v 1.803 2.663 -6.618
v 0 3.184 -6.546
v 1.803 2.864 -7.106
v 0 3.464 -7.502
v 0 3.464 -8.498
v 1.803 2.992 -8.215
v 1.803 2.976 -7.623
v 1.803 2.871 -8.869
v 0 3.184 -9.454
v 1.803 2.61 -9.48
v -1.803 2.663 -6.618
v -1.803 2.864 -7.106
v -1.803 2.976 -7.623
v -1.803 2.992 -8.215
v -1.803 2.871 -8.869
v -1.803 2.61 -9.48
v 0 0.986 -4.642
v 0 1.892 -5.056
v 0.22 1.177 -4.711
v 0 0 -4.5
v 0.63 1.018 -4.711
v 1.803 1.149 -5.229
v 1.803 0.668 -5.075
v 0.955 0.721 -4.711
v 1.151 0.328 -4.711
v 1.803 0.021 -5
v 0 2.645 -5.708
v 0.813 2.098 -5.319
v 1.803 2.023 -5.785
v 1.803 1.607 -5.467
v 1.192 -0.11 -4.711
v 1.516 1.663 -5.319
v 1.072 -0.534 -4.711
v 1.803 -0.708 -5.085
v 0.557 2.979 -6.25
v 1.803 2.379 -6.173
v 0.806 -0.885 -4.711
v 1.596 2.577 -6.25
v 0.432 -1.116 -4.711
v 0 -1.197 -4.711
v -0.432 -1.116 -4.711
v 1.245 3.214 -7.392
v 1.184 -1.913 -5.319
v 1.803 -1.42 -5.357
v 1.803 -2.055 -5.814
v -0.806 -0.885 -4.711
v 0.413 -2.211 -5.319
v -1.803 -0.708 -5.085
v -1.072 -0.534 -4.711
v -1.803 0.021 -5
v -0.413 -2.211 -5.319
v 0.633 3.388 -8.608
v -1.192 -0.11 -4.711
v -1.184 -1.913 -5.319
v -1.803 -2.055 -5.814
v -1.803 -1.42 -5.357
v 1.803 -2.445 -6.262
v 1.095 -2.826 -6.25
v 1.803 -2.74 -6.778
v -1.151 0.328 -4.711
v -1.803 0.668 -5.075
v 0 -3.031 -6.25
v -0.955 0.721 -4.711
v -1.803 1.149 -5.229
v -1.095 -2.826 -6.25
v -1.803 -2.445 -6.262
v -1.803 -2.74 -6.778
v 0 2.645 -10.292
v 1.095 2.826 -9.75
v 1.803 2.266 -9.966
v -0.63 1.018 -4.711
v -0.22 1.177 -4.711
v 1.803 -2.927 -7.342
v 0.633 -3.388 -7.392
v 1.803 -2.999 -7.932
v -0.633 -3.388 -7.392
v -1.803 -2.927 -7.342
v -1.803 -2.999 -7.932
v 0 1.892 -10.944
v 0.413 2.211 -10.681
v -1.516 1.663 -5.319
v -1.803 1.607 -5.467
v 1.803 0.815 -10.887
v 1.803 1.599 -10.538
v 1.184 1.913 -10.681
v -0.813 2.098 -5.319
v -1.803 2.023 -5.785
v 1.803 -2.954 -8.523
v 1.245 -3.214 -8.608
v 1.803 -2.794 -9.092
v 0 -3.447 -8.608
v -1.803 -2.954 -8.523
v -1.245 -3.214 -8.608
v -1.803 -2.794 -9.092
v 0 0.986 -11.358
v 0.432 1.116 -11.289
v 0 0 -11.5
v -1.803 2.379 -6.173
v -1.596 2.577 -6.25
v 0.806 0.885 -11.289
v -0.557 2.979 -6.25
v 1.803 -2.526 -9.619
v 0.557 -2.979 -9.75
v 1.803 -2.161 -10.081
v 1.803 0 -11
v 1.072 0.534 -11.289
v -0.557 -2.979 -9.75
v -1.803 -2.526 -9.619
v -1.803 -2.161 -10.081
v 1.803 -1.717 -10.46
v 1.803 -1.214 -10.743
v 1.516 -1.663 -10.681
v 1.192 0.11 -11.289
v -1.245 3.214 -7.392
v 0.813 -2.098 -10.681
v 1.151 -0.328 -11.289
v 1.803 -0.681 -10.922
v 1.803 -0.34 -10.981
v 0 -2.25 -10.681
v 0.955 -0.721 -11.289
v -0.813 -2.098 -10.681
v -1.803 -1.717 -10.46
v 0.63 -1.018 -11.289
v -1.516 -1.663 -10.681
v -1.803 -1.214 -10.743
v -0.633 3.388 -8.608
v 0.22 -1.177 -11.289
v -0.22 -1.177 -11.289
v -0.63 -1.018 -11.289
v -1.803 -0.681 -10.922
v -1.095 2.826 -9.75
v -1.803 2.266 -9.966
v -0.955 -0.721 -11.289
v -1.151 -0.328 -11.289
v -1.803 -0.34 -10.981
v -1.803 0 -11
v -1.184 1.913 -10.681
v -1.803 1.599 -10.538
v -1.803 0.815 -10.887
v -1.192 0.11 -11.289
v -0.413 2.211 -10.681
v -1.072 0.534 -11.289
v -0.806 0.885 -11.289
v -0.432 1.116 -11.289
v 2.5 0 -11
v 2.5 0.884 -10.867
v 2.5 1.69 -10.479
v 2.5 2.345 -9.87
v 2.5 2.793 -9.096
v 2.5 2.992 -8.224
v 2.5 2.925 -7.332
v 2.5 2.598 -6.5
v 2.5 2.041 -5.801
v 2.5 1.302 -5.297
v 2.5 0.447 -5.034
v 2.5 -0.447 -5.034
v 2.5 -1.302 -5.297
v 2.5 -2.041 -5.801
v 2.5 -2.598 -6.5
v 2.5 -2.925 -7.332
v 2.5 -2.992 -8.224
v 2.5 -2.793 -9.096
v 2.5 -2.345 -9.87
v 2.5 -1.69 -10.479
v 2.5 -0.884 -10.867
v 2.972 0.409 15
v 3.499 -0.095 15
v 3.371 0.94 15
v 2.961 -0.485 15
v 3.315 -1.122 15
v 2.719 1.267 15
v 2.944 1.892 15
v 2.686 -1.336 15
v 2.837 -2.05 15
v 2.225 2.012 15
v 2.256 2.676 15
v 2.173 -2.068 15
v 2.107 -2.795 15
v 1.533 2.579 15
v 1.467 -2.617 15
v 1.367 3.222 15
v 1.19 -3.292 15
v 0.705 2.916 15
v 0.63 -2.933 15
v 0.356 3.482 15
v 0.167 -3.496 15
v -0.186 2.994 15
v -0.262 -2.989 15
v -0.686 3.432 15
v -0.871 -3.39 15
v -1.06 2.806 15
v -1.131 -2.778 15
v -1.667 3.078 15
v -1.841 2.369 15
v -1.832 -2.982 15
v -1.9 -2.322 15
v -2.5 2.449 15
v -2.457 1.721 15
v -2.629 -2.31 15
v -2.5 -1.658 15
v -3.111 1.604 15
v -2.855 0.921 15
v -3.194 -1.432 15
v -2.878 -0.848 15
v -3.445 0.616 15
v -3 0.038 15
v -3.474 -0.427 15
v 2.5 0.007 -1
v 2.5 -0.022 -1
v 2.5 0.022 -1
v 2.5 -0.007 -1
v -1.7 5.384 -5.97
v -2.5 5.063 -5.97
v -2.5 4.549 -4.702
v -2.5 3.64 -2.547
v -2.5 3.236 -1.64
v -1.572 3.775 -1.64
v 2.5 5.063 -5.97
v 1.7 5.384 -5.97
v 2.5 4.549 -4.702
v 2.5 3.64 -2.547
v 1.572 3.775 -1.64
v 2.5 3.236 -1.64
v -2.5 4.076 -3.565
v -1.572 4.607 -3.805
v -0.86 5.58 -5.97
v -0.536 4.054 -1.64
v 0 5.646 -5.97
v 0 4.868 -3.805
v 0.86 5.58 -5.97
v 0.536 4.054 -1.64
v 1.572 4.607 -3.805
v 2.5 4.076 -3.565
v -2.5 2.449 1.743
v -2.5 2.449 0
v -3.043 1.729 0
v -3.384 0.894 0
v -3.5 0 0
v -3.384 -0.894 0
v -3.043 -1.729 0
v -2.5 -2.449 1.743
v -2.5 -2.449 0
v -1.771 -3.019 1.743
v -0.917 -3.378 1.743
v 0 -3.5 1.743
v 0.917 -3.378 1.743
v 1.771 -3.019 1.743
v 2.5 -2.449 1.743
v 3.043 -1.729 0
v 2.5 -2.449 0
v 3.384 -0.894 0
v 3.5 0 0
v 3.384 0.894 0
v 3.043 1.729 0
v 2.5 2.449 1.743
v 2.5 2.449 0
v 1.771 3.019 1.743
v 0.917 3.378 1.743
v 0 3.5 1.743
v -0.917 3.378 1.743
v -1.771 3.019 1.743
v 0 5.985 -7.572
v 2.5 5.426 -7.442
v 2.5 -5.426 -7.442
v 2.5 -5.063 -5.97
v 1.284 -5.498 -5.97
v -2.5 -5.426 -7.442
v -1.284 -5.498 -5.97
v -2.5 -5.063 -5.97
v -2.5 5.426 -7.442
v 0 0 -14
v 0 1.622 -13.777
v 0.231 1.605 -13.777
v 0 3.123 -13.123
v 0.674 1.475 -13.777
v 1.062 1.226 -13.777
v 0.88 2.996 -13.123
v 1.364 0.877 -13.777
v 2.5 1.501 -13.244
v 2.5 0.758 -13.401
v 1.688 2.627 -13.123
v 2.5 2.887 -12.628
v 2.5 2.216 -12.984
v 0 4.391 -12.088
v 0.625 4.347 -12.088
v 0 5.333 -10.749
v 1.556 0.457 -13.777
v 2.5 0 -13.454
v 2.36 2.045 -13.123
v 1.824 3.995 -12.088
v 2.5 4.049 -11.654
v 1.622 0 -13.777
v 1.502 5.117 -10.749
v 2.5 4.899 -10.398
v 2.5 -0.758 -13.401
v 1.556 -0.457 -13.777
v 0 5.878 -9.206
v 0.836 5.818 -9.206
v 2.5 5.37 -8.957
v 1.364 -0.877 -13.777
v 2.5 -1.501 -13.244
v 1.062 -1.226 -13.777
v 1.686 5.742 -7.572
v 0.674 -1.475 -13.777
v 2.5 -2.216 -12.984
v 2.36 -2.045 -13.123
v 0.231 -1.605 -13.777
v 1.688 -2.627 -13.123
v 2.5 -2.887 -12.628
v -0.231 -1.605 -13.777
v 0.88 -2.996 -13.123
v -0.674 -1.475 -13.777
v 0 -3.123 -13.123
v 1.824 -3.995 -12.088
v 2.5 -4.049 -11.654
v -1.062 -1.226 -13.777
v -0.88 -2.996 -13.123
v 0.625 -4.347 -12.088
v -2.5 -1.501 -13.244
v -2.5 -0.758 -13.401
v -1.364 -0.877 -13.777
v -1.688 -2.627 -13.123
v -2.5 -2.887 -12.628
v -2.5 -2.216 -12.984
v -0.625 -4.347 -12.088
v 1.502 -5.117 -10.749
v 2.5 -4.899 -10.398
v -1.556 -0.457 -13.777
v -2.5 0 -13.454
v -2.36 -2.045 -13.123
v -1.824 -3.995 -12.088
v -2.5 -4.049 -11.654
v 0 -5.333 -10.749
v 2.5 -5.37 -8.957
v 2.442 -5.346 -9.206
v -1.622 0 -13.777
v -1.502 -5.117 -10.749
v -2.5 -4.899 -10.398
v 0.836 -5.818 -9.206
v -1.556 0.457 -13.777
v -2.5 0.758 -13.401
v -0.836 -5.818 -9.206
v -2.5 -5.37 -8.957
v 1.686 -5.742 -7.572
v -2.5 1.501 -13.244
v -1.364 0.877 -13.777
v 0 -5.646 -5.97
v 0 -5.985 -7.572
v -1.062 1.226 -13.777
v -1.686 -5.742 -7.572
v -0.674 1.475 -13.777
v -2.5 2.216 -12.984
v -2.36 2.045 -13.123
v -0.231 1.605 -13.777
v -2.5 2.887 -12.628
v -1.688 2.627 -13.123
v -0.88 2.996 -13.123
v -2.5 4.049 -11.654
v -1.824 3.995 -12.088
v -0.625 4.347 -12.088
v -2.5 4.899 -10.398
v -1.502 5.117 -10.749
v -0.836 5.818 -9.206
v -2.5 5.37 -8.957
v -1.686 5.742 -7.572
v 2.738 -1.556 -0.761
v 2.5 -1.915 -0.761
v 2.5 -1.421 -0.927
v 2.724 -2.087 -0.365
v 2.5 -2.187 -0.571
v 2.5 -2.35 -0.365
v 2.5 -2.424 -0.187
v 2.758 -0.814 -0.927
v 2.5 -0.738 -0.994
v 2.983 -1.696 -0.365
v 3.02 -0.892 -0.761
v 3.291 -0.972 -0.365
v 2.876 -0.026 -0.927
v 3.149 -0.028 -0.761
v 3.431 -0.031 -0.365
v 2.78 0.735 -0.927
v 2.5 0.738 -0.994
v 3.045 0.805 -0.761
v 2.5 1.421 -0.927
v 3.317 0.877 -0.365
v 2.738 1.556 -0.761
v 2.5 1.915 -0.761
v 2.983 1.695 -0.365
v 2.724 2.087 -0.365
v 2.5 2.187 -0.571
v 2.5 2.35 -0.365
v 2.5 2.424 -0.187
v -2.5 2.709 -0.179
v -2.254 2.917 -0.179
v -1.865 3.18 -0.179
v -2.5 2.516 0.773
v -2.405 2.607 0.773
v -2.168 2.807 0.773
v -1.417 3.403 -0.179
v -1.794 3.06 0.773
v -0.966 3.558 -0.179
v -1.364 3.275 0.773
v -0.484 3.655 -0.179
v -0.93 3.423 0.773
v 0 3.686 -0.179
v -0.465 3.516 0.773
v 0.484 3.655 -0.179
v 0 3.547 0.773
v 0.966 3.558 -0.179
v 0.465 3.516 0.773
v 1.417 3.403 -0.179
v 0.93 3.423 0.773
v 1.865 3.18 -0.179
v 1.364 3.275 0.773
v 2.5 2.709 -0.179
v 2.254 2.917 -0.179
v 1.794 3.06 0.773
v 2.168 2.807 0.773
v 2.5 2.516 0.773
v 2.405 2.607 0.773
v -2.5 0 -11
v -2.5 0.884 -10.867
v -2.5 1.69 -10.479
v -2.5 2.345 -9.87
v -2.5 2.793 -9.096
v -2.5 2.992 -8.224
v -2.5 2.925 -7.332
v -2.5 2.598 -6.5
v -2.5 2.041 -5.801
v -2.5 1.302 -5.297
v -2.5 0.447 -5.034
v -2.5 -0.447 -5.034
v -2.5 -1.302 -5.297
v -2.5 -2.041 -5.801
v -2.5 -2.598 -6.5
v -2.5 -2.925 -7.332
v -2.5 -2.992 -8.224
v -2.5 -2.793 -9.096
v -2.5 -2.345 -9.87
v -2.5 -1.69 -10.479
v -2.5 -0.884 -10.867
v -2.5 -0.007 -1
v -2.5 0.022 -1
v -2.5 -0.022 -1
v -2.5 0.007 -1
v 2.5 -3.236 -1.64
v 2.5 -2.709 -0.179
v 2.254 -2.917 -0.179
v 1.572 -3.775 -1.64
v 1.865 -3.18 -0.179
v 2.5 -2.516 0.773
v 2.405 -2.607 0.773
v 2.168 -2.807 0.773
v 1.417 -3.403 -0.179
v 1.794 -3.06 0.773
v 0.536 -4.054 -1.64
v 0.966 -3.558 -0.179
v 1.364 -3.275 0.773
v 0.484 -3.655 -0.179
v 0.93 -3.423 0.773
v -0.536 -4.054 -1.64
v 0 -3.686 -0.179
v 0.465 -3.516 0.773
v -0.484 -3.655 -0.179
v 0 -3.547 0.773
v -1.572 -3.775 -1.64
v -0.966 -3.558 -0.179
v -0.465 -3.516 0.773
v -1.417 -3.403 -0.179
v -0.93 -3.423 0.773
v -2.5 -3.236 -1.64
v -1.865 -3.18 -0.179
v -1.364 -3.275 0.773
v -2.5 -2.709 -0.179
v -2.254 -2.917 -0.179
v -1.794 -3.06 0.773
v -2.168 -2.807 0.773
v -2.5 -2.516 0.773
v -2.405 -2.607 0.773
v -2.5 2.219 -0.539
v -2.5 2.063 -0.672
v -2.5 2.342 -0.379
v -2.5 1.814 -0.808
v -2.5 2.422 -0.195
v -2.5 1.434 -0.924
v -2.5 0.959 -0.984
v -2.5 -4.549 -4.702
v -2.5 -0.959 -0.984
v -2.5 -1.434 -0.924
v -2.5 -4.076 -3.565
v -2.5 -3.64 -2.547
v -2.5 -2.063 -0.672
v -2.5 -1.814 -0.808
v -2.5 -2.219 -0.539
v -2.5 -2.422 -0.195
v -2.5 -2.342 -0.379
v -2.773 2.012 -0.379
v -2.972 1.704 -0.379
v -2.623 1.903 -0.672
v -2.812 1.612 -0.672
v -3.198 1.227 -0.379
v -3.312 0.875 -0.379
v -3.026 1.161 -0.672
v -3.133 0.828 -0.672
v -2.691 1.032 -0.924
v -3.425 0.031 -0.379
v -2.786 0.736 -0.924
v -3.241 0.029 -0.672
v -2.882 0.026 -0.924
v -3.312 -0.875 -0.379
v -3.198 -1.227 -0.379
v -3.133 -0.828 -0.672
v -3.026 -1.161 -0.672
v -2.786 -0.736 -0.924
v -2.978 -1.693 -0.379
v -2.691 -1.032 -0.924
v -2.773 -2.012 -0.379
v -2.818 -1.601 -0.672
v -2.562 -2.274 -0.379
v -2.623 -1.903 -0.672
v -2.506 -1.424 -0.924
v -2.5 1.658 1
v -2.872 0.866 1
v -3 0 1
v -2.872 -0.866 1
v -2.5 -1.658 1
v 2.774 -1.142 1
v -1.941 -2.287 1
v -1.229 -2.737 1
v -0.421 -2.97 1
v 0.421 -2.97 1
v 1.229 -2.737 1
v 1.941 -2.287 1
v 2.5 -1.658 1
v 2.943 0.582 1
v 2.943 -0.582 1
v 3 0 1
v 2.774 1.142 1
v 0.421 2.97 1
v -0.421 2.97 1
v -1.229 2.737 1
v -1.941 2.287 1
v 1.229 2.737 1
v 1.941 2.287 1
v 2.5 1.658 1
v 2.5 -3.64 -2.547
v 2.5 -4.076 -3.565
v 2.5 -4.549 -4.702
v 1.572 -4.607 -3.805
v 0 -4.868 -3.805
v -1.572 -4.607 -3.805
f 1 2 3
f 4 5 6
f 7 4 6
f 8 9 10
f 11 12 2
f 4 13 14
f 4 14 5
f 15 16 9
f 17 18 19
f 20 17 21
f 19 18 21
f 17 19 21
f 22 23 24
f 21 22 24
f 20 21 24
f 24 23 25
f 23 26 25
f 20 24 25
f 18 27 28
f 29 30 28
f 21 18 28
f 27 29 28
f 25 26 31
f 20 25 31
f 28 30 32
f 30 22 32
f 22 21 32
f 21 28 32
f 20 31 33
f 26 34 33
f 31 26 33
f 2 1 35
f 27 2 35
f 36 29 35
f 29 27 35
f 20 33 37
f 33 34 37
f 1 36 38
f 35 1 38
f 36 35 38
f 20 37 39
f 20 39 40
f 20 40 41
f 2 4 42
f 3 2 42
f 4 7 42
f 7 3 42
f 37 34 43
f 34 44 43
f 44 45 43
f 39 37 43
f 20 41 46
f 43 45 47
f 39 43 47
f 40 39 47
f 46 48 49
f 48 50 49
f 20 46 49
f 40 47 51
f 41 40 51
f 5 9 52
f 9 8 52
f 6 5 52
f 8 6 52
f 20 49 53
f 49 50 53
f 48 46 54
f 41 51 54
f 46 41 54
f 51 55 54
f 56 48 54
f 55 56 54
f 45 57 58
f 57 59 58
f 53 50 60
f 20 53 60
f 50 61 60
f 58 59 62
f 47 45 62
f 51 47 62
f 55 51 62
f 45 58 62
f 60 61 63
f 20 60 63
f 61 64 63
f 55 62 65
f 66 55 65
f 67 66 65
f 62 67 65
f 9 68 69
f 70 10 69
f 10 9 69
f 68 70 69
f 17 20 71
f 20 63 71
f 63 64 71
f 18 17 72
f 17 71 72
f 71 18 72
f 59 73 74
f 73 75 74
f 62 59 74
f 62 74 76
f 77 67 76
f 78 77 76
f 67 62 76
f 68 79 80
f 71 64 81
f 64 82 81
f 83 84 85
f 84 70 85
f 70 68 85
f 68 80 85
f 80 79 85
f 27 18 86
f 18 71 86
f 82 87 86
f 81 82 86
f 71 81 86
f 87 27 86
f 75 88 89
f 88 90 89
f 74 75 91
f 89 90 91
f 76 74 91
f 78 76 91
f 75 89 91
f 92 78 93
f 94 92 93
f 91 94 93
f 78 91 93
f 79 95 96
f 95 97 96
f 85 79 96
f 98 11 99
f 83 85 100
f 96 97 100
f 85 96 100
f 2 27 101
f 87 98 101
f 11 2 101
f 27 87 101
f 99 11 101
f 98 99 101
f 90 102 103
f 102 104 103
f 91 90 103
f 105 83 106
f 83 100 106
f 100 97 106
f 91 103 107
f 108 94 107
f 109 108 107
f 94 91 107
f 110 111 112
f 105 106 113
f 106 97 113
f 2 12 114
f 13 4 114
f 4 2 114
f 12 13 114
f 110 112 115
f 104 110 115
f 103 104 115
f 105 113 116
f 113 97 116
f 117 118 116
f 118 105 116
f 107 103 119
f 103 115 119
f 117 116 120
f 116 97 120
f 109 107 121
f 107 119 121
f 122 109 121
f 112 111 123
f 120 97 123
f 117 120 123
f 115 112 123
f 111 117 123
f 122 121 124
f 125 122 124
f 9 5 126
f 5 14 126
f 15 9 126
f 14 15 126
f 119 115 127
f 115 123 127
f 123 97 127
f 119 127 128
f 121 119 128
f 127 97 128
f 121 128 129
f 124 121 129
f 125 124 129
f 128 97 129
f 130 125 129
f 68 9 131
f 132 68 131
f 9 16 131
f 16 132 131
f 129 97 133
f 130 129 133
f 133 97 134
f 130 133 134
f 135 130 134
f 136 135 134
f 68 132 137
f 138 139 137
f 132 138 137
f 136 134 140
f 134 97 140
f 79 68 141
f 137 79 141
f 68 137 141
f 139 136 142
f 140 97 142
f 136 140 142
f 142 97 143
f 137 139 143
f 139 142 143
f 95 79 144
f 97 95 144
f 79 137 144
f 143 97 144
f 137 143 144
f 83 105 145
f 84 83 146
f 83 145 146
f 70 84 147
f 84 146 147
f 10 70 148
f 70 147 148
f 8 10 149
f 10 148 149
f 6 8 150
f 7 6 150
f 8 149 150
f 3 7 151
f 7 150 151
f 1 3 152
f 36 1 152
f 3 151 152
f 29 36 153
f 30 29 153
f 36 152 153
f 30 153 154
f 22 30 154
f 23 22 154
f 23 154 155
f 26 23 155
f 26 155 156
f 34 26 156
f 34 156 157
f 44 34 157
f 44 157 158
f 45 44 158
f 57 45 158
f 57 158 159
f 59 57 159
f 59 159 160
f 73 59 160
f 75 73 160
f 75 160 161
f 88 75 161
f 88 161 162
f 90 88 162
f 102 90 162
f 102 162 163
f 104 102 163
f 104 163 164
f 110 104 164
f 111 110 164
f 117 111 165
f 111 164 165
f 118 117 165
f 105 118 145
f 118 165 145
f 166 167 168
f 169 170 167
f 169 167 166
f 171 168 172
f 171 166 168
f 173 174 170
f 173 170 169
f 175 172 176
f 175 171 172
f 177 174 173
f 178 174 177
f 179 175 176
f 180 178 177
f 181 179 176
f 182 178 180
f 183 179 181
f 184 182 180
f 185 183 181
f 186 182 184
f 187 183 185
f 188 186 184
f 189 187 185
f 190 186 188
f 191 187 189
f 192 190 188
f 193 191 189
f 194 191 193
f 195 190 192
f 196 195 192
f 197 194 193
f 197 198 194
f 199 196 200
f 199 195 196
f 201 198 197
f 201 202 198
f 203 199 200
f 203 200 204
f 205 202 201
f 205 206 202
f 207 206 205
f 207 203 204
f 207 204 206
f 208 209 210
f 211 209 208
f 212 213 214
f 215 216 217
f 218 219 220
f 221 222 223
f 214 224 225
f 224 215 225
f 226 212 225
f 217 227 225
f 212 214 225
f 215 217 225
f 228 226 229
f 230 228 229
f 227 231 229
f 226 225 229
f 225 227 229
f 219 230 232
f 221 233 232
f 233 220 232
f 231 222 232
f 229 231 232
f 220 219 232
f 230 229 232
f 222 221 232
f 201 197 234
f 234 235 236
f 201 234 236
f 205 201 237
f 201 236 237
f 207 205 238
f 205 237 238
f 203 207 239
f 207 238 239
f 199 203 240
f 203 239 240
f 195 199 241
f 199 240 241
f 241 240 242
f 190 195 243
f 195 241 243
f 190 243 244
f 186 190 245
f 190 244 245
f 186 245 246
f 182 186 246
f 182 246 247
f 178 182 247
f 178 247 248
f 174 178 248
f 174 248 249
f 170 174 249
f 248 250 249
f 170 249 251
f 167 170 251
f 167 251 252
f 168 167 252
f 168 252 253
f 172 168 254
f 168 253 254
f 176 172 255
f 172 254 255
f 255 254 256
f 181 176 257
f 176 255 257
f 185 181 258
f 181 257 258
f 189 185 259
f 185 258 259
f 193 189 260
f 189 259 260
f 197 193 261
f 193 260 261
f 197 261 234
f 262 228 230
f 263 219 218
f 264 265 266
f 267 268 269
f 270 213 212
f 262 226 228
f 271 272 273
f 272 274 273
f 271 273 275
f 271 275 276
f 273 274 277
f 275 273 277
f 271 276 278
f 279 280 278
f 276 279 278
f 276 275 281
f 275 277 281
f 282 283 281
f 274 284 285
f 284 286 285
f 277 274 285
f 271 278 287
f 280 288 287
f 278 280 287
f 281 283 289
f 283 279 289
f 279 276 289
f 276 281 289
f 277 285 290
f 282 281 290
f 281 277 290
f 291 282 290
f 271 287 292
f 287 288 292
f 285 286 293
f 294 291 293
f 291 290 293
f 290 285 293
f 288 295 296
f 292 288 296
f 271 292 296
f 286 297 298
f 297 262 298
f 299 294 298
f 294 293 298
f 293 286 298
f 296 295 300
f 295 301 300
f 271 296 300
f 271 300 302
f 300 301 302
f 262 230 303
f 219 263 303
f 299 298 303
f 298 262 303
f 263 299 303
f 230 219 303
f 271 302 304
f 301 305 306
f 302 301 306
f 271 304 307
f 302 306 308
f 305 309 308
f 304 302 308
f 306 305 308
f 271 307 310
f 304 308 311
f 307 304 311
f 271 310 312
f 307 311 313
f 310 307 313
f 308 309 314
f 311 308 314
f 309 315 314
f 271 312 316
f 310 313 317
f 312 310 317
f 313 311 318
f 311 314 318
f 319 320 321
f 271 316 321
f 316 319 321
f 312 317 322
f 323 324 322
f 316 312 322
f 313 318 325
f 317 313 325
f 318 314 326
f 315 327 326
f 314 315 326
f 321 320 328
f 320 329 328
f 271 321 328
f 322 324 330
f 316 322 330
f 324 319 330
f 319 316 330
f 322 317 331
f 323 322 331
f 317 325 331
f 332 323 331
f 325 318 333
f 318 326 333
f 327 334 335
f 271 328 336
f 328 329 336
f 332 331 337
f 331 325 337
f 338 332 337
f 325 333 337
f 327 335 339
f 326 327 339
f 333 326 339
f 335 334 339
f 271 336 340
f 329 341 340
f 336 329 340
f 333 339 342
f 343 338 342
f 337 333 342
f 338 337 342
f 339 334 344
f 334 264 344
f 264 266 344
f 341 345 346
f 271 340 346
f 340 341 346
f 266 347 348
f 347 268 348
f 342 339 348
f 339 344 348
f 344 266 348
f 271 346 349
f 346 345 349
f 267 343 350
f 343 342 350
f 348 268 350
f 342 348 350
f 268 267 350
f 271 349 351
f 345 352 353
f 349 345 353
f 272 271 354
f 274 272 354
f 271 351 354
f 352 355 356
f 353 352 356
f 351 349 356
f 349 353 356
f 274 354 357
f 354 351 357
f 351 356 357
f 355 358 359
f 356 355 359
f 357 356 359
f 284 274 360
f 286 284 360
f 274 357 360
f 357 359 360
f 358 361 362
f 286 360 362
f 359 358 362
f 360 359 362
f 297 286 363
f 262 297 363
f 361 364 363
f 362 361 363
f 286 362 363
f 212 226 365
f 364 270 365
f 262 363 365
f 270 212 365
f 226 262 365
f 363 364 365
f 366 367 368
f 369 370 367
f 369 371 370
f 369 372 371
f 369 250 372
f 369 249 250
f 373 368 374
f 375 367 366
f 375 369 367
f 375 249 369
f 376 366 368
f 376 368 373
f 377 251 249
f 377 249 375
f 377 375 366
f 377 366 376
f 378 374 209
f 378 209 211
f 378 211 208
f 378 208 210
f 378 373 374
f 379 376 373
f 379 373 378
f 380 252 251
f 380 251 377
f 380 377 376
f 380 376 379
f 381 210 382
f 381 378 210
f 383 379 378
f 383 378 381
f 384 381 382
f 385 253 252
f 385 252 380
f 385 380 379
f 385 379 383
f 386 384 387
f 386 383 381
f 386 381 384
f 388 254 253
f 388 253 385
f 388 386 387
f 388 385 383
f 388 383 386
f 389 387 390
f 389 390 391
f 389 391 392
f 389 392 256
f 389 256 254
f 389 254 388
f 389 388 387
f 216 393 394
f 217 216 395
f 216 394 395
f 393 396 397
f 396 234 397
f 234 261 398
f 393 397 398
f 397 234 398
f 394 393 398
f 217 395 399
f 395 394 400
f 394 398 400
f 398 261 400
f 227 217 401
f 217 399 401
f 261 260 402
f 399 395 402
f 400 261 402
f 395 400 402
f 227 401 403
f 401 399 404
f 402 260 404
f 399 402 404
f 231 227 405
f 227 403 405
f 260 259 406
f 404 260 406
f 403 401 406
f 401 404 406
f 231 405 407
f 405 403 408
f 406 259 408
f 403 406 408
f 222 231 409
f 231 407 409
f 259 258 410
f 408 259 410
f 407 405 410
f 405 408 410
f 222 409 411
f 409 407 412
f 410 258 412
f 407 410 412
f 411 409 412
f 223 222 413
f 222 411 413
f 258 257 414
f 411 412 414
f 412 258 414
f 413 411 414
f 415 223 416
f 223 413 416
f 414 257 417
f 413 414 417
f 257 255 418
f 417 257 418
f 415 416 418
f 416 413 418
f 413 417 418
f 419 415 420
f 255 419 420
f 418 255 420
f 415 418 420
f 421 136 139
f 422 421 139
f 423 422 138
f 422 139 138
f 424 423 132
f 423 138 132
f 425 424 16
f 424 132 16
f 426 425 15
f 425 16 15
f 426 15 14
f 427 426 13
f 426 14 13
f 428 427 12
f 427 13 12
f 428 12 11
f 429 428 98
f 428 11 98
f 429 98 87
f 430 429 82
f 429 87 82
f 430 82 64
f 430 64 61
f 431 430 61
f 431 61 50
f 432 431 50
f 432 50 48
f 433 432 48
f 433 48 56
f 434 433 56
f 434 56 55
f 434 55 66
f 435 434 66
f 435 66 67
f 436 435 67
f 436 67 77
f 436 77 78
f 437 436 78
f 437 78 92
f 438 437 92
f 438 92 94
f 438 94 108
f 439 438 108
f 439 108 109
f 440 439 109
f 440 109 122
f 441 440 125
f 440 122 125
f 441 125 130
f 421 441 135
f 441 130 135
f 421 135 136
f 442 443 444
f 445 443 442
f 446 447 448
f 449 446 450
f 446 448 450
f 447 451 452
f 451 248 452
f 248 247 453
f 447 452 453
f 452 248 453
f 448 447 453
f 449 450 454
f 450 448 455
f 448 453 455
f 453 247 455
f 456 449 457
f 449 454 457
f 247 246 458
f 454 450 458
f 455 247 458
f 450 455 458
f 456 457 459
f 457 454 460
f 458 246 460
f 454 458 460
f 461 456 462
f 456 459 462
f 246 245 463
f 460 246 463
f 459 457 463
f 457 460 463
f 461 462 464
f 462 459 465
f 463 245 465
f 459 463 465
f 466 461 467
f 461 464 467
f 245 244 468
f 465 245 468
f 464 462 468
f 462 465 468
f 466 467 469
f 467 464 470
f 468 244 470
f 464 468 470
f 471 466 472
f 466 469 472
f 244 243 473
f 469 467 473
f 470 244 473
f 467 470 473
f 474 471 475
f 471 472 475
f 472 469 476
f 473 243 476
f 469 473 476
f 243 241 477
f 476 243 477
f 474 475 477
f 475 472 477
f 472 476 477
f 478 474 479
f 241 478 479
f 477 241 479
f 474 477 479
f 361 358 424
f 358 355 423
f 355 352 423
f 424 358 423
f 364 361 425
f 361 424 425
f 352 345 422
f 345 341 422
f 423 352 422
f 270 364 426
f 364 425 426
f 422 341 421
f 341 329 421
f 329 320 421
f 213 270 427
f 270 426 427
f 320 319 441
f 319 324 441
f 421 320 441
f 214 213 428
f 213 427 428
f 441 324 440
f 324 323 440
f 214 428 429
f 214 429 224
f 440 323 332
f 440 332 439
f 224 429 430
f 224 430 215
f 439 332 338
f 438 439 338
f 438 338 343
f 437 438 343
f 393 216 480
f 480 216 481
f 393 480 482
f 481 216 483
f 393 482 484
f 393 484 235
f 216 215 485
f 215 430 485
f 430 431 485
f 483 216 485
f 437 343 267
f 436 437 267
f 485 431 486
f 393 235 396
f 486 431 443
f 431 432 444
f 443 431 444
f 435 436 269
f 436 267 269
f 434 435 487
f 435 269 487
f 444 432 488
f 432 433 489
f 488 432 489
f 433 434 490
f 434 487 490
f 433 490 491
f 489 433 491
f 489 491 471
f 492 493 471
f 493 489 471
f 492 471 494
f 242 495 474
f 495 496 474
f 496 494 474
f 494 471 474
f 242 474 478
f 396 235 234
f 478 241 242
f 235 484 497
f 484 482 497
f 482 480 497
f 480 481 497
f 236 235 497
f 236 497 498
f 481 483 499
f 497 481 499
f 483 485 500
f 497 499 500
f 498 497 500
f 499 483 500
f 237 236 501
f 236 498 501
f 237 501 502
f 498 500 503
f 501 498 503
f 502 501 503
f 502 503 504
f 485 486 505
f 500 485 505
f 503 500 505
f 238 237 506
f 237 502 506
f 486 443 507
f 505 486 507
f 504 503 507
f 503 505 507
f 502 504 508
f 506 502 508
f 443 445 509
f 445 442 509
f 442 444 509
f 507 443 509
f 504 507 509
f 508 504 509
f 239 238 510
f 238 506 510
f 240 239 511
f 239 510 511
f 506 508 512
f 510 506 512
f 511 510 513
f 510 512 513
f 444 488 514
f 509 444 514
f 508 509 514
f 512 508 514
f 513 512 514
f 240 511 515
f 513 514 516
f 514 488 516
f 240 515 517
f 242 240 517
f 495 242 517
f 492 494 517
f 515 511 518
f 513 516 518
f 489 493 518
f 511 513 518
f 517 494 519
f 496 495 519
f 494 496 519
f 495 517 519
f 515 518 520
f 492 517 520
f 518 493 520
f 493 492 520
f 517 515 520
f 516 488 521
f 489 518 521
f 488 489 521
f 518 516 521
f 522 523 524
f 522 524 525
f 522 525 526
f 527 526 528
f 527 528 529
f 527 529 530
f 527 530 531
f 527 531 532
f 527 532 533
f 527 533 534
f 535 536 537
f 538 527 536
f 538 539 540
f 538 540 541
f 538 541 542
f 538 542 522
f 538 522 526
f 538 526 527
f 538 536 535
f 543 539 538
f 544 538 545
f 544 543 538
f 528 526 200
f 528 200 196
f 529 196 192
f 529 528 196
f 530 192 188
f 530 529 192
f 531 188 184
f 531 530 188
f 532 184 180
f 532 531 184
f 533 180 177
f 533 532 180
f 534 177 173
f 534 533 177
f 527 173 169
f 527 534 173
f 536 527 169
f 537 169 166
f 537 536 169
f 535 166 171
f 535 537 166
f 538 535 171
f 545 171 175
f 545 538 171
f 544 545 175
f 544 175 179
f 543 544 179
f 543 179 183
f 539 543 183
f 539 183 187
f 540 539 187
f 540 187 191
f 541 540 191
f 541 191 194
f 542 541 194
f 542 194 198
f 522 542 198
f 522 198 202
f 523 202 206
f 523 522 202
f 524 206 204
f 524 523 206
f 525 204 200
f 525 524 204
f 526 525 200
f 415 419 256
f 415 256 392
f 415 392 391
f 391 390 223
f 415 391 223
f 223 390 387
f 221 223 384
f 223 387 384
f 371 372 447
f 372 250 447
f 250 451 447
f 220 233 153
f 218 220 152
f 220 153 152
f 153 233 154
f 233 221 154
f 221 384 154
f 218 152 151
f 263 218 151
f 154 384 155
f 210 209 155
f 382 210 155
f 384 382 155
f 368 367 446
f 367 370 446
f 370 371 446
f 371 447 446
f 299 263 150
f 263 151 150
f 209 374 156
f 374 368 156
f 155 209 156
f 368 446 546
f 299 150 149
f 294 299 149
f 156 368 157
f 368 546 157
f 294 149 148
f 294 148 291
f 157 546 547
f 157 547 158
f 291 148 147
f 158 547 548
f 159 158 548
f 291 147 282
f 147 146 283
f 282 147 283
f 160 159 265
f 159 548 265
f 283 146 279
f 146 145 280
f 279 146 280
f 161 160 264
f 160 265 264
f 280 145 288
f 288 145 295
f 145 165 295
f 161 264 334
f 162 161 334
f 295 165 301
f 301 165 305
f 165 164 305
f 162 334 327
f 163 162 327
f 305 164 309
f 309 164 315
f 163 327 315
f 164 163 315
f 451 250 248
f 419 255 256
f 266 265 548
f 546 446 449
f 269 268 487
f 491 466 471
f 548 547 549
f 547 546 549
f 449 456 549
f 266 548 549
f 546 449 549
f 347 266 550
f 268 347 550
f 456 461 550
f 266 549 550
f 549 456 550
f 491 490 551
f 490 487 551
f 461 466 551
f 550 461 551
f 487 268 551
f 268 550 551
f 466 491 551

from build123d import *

# Parameters (mm, degrees)
SKETCH2_W           = 3.765548925
SKETCH2_H           = 14.748929387
SKETCH2_W_2         = 4.619974481
CUT_EXTRUDE1_DEPTH  = 17.5
CHAMFER1_SIZE       = 0.353571801
CHAMFER1_SIZE_2     = 0.5
SKETCH3_R           = 3
CUT_EXTRUDE2_DEPTH  = 35
SKETCH4_R           = 3.5
SKETCH4_R_2         = 3
BOSS_EXTRUDE1_DEPTH = 15
BOSS_EXTRUDE2_DEPTH = 1
BOSS_EXTRUDE3_START = -1
SKETCH4_2_R         = 3.5
SKETCH4_2_R_2       = 3
BOSS_EXTRUDE3_DEPTH = 1
BOSS_EXTRUDE4_START = -1
BOSS_EXTRUDE4_DEPTH = 1
FILLET1_R           = 1
FILLET2_R           = 10


# Some blends are built 0.0001 mm under size
with BuildPart() as part:
    # Sketch1 → Revolve1 (revolve)
    with BuildSketch(Plane(origin=(0, 0, 0), x_dir=(0, 0, -1), z_dir=(1, 0, 0))):
        with BuildLine():
            Line((0, 3.5), (0, 0))
            Line((0, 0), (4.5, 0))
            ThreePointArc((4.5, 0), (8, 3.5), (11.5, 0))
            Line((11.5, 0), (14, 0))
            ThreePointArc((14, 0), (11.451186904, 4.908086078), (5.97023035, 5.6462408))
            Line((5.97023035, 5.6462408), (0, 3.5))
        make_face()
    revolve(axis=Axis((0, 0, 0), (0, 0, -1)))

    # Sketch2 → Cut-Extrude1 (cut, symmetric)
    with BuildSketch(Plane(origin=(0, 0, 0), x_dir=(1, 0, 0), z_dir=(0, 1, 0))):
        with Locations((-4.382774463, 6.625535306)):
            Rectangle(SKETCH2_W, SKETCH2_H)
        with Locations((4.80998724, 6.625535306)):
            Rectangle(SKETCH2_W_2, SKETCH2_H)
    extrude(amount=CUT_EXTRUDE1_DEPTH, both=True, mode=Mode.SUBTRACT)

    # Chamfer1
    # the kernel refuses this chamfer: 0.5, 0.353571801 mm, written as the material it takes off along each edge
    with BuildSketch(Plane(origin=(-2.5, 0, -8), x_dir=(0, 0, 1), z_dir=(0, 1, 0))) as chamfer1_piece_1:
        with BuildLine():
            Line((2.807242504, 0.409691525), (2.449489743 + CHAMFER1_SIZE * 0.999999998636, 0))
            Line((2.449489743 + CHAMFER1_SIZE * 0.999999998636, 0), (2.449489743, 0))
            ThreePointArc((2.449489743, 0), (2.641353047, 0.203643303), (2.807242504, 0.409691525))
        make_face()
    revolve(axis=Axis((-2.5, 0, -8), (1, 0, 0)), mode=Mode.SUBTRACT)
    with BuildSketch(Plane(origin=(2.5, 0, -8), x_dir=(0, 0, -1), z_dir=(0, 1, 0))) as chamfer1_piece_2:
        with BuildLine():
            Line((2.449489743 + CHAMFER1_SIZE_2, 0), (2.689392867, 0.260096876))
            ThreePointArc((2.689392867, 0.260096876), (2.573005025, 0.127312675), (2.449489743, 0))
            Line((2.449489743, 0), (2.449489743 + CHAMFER1_SIZE_2, 0))
        make_face()
    revolve(axis=Axis((2.5, 0, -8), (-1, 0, 0)), mode=Mode.SUBTRACT)

    # Sketch3 → Cut-Extrude2 (cut)
    with BuildSketch(Plane(origin=(2.5, 0, 0), x_dir=(0, 0, -1), z_dir=(1, 0, 0))):
        with Locations((8, 0)):
            Circle(SKETCH3_R)
    extrude(amount=-CUT_EXTRUDE2_DEPTH, mode=Mode.SUBTRACT)

    # Sketch4 → Boss-Extrude1 (add)
    with BuildSketch(Plane.XY):
        with Locations(Location((0, 0, 0), (0, 0, 135.584691403))):
            Circle(SKETCH4_R)
        with Locations(Location((0, 0, 0), (0, 0, 213.557309762))):
            Circle(SKETCH4_R_2, mode=Mode.SUBTRACT)
    extrude(amount=BOSS_EXTRUDE1_DEPTH)

    # Sketch5 → Boss-Extrude2 (add)
    with BuildSketch(Plane.XY):
        with BuildLine():
            Line((2.5, 1.658312395), (2.5, -1.658312395))
            ThreePointArc((2.5, -1.658312395), (2.872281323, -0.866025404), (3, 0))
            ThreePointArc((3, 0), (2.872281323, 0.866025404), (2.5, 1.658312395))
        make_face()
        with BuildLine():
            ThreePointArc((-2.5, -1.658312395), (0, -3), (2.5, -1.658312395))
            Line((2.5, -1.658312395), (2.5, 1.658312395))
            ThreePointArc((2.5, 1.658312395), (0, 3), (-2.5, 1.658312395))
            Line((-2.5, 1.658312395), (-2.5, -1.658312395))
        make_face()
        with BuildLine():
            ThreePointArc((-2.5, 1.658312395), (-3, 0), (-2.5, -1.658312395))
            Line((-2.5, -1.658312395), (-2.5, 1.658312395))
        make_face()
    extrude(amount=BOSS_EXTRUDE2_DEPTH)

    # Sketch4<2> → Boss-Extrude3 (add)
    with BuildSketch(Plane.XY.offset(BOSS_EXTRUDE3_START)):
        with Locations(Location((0, 0, 0), (0, 0, 135.584691403))):
            Circle(SKETCH4_2_R)
        Circle(SKETCH4_2_R_2, mode=Mode.SUBTRACT)
    extrude(amount=BOSS_EXTRUDE3_DEPTH)

    # Sketch5<4> → Boss-Extrude4 (add)
    with BuildSketch(Plane.XY.offset(BOSS_EXTRUDE4_START)):
        with BuildLine():
            Line((2.5, 1.658312395), (2.5, -1.658312395))
            ThreePointArc((2.5, -1.658312395), (2.872281323, -0.866025404), (3, 0))
            ThreePointArc((3, 0), (2.872281323, 0.866025404), (2.5, 1.658312395))
        make_face()
        with BuildLine():
            ThreePointArc((-2.5, 1.658312395), (-3, 0), (-2.5, -1.658312395))
            Line((-2.5, -1.658312395), (-2.5, 1.658312395))
        make_face()
    extrude(amount=BOSS_EXTRUDE4_DEPTH)

    # Fillet1
    fillet1_edges = [part.edges().sort_by_distance(p)[0] for p in [
        (-3.5, 0, -1),
        (3.5, 0, -1),
    ]]
    fillet(fillet1_edges, radius=FILLET1_R - 0.0001)  # a hair under: the kernel refuses the full size

    # Fillet2
    # the kernel refuses this fillet: 10 mm, written as the material it adds along each edge
    with BuildSketch(Plane(origin=(0, 0, 0), x_dir=(-0.8914706902273792, -0.453078369010837, 0), z_dir=(0.453078369010837, -0.8914706902273792, 0))) as fillet2_piece_1_section:
        with BuildLine():
            CenterArc((3.5 + FILLET2_R, -FILLET2_R * 0.174285392608), FILLET2_R, 160.226973292, 19.773026708)
            Line((3.5 + FILLET2_R * 0.0589598667305, FILLET2_R * 0.164009549087), (3.5, 0))
            Line((3.5, 0), (3.5, -FILLET2_R * 0.174285392608))
        make_face()
    fillet2_piece_1 = revolve(axis=Axis((0, 0, 0), (0, 0, -1)), revolution_arc=233.882722234, mode=Mode.PRIVATE)
    fillet2_piece_1 = split(fillet2_piece_1, bisect_by=Plane(origin=(2.5, 0, 0), z_dir=(-1, 0, 0)), keep=Keep.TOP, mode=Mode.PRIVATE)
    fillet2_piece_1 = split(fillet2_piece_1, bisect_by=Plane(origin=(-2.5, 0, 0), z_dir=(1, 0, 0)), keep=Keep.TOP, mode=Mode.PRIVATE)
    add(fillet2_piece_1)
    with BuildSketch(Plane(origin=(0, 0, 0), x_dir=(0.8914706902273793, 0.4530783690108364, 0), z_dir=(-0.4530783690108364, 0.8914706902273793, 0))) as fillet2_piece_2_section:
        with BuildLine():
            CenterArc((3.5 + FILLET2_R, -FILLET2_R * 0.174285392608), FILLET2_R, 160.226973292, 19.773026708)
            Line((3.5 + FILLET2_R * 0.0589598667305, FILLET2_R * 0.164009549087), (3.5, 0))
            Line((3.5, 0), (3.5, -FILLET2_R * 0.174285392608))
        make_face()
    fillet2_piece_2 = revolve(axis=Axis((0, 0, 0), (0, 0, -1)), revolution_arc=233.882722234, mode=Mode.PRIVATE)
    fillet2_piece_2 = split(fillet2_piece_2, bisect_by=Plane(origin=(2.5, 0, 0), z_dir=(-1, 0, 0)), keep=Keep.TOP, mode=Mode.PRIVATE)
    fillet2_piece_2 = split(fillet2_piece_2, bisect_by=Plane(origin=(-2.5, 0, 0), z_dir=(1, 0, 0)), keep=Keep.TOP, mode=Mode.PRIVATE)
    add(fillet2_piece_2)


solid = part.part
